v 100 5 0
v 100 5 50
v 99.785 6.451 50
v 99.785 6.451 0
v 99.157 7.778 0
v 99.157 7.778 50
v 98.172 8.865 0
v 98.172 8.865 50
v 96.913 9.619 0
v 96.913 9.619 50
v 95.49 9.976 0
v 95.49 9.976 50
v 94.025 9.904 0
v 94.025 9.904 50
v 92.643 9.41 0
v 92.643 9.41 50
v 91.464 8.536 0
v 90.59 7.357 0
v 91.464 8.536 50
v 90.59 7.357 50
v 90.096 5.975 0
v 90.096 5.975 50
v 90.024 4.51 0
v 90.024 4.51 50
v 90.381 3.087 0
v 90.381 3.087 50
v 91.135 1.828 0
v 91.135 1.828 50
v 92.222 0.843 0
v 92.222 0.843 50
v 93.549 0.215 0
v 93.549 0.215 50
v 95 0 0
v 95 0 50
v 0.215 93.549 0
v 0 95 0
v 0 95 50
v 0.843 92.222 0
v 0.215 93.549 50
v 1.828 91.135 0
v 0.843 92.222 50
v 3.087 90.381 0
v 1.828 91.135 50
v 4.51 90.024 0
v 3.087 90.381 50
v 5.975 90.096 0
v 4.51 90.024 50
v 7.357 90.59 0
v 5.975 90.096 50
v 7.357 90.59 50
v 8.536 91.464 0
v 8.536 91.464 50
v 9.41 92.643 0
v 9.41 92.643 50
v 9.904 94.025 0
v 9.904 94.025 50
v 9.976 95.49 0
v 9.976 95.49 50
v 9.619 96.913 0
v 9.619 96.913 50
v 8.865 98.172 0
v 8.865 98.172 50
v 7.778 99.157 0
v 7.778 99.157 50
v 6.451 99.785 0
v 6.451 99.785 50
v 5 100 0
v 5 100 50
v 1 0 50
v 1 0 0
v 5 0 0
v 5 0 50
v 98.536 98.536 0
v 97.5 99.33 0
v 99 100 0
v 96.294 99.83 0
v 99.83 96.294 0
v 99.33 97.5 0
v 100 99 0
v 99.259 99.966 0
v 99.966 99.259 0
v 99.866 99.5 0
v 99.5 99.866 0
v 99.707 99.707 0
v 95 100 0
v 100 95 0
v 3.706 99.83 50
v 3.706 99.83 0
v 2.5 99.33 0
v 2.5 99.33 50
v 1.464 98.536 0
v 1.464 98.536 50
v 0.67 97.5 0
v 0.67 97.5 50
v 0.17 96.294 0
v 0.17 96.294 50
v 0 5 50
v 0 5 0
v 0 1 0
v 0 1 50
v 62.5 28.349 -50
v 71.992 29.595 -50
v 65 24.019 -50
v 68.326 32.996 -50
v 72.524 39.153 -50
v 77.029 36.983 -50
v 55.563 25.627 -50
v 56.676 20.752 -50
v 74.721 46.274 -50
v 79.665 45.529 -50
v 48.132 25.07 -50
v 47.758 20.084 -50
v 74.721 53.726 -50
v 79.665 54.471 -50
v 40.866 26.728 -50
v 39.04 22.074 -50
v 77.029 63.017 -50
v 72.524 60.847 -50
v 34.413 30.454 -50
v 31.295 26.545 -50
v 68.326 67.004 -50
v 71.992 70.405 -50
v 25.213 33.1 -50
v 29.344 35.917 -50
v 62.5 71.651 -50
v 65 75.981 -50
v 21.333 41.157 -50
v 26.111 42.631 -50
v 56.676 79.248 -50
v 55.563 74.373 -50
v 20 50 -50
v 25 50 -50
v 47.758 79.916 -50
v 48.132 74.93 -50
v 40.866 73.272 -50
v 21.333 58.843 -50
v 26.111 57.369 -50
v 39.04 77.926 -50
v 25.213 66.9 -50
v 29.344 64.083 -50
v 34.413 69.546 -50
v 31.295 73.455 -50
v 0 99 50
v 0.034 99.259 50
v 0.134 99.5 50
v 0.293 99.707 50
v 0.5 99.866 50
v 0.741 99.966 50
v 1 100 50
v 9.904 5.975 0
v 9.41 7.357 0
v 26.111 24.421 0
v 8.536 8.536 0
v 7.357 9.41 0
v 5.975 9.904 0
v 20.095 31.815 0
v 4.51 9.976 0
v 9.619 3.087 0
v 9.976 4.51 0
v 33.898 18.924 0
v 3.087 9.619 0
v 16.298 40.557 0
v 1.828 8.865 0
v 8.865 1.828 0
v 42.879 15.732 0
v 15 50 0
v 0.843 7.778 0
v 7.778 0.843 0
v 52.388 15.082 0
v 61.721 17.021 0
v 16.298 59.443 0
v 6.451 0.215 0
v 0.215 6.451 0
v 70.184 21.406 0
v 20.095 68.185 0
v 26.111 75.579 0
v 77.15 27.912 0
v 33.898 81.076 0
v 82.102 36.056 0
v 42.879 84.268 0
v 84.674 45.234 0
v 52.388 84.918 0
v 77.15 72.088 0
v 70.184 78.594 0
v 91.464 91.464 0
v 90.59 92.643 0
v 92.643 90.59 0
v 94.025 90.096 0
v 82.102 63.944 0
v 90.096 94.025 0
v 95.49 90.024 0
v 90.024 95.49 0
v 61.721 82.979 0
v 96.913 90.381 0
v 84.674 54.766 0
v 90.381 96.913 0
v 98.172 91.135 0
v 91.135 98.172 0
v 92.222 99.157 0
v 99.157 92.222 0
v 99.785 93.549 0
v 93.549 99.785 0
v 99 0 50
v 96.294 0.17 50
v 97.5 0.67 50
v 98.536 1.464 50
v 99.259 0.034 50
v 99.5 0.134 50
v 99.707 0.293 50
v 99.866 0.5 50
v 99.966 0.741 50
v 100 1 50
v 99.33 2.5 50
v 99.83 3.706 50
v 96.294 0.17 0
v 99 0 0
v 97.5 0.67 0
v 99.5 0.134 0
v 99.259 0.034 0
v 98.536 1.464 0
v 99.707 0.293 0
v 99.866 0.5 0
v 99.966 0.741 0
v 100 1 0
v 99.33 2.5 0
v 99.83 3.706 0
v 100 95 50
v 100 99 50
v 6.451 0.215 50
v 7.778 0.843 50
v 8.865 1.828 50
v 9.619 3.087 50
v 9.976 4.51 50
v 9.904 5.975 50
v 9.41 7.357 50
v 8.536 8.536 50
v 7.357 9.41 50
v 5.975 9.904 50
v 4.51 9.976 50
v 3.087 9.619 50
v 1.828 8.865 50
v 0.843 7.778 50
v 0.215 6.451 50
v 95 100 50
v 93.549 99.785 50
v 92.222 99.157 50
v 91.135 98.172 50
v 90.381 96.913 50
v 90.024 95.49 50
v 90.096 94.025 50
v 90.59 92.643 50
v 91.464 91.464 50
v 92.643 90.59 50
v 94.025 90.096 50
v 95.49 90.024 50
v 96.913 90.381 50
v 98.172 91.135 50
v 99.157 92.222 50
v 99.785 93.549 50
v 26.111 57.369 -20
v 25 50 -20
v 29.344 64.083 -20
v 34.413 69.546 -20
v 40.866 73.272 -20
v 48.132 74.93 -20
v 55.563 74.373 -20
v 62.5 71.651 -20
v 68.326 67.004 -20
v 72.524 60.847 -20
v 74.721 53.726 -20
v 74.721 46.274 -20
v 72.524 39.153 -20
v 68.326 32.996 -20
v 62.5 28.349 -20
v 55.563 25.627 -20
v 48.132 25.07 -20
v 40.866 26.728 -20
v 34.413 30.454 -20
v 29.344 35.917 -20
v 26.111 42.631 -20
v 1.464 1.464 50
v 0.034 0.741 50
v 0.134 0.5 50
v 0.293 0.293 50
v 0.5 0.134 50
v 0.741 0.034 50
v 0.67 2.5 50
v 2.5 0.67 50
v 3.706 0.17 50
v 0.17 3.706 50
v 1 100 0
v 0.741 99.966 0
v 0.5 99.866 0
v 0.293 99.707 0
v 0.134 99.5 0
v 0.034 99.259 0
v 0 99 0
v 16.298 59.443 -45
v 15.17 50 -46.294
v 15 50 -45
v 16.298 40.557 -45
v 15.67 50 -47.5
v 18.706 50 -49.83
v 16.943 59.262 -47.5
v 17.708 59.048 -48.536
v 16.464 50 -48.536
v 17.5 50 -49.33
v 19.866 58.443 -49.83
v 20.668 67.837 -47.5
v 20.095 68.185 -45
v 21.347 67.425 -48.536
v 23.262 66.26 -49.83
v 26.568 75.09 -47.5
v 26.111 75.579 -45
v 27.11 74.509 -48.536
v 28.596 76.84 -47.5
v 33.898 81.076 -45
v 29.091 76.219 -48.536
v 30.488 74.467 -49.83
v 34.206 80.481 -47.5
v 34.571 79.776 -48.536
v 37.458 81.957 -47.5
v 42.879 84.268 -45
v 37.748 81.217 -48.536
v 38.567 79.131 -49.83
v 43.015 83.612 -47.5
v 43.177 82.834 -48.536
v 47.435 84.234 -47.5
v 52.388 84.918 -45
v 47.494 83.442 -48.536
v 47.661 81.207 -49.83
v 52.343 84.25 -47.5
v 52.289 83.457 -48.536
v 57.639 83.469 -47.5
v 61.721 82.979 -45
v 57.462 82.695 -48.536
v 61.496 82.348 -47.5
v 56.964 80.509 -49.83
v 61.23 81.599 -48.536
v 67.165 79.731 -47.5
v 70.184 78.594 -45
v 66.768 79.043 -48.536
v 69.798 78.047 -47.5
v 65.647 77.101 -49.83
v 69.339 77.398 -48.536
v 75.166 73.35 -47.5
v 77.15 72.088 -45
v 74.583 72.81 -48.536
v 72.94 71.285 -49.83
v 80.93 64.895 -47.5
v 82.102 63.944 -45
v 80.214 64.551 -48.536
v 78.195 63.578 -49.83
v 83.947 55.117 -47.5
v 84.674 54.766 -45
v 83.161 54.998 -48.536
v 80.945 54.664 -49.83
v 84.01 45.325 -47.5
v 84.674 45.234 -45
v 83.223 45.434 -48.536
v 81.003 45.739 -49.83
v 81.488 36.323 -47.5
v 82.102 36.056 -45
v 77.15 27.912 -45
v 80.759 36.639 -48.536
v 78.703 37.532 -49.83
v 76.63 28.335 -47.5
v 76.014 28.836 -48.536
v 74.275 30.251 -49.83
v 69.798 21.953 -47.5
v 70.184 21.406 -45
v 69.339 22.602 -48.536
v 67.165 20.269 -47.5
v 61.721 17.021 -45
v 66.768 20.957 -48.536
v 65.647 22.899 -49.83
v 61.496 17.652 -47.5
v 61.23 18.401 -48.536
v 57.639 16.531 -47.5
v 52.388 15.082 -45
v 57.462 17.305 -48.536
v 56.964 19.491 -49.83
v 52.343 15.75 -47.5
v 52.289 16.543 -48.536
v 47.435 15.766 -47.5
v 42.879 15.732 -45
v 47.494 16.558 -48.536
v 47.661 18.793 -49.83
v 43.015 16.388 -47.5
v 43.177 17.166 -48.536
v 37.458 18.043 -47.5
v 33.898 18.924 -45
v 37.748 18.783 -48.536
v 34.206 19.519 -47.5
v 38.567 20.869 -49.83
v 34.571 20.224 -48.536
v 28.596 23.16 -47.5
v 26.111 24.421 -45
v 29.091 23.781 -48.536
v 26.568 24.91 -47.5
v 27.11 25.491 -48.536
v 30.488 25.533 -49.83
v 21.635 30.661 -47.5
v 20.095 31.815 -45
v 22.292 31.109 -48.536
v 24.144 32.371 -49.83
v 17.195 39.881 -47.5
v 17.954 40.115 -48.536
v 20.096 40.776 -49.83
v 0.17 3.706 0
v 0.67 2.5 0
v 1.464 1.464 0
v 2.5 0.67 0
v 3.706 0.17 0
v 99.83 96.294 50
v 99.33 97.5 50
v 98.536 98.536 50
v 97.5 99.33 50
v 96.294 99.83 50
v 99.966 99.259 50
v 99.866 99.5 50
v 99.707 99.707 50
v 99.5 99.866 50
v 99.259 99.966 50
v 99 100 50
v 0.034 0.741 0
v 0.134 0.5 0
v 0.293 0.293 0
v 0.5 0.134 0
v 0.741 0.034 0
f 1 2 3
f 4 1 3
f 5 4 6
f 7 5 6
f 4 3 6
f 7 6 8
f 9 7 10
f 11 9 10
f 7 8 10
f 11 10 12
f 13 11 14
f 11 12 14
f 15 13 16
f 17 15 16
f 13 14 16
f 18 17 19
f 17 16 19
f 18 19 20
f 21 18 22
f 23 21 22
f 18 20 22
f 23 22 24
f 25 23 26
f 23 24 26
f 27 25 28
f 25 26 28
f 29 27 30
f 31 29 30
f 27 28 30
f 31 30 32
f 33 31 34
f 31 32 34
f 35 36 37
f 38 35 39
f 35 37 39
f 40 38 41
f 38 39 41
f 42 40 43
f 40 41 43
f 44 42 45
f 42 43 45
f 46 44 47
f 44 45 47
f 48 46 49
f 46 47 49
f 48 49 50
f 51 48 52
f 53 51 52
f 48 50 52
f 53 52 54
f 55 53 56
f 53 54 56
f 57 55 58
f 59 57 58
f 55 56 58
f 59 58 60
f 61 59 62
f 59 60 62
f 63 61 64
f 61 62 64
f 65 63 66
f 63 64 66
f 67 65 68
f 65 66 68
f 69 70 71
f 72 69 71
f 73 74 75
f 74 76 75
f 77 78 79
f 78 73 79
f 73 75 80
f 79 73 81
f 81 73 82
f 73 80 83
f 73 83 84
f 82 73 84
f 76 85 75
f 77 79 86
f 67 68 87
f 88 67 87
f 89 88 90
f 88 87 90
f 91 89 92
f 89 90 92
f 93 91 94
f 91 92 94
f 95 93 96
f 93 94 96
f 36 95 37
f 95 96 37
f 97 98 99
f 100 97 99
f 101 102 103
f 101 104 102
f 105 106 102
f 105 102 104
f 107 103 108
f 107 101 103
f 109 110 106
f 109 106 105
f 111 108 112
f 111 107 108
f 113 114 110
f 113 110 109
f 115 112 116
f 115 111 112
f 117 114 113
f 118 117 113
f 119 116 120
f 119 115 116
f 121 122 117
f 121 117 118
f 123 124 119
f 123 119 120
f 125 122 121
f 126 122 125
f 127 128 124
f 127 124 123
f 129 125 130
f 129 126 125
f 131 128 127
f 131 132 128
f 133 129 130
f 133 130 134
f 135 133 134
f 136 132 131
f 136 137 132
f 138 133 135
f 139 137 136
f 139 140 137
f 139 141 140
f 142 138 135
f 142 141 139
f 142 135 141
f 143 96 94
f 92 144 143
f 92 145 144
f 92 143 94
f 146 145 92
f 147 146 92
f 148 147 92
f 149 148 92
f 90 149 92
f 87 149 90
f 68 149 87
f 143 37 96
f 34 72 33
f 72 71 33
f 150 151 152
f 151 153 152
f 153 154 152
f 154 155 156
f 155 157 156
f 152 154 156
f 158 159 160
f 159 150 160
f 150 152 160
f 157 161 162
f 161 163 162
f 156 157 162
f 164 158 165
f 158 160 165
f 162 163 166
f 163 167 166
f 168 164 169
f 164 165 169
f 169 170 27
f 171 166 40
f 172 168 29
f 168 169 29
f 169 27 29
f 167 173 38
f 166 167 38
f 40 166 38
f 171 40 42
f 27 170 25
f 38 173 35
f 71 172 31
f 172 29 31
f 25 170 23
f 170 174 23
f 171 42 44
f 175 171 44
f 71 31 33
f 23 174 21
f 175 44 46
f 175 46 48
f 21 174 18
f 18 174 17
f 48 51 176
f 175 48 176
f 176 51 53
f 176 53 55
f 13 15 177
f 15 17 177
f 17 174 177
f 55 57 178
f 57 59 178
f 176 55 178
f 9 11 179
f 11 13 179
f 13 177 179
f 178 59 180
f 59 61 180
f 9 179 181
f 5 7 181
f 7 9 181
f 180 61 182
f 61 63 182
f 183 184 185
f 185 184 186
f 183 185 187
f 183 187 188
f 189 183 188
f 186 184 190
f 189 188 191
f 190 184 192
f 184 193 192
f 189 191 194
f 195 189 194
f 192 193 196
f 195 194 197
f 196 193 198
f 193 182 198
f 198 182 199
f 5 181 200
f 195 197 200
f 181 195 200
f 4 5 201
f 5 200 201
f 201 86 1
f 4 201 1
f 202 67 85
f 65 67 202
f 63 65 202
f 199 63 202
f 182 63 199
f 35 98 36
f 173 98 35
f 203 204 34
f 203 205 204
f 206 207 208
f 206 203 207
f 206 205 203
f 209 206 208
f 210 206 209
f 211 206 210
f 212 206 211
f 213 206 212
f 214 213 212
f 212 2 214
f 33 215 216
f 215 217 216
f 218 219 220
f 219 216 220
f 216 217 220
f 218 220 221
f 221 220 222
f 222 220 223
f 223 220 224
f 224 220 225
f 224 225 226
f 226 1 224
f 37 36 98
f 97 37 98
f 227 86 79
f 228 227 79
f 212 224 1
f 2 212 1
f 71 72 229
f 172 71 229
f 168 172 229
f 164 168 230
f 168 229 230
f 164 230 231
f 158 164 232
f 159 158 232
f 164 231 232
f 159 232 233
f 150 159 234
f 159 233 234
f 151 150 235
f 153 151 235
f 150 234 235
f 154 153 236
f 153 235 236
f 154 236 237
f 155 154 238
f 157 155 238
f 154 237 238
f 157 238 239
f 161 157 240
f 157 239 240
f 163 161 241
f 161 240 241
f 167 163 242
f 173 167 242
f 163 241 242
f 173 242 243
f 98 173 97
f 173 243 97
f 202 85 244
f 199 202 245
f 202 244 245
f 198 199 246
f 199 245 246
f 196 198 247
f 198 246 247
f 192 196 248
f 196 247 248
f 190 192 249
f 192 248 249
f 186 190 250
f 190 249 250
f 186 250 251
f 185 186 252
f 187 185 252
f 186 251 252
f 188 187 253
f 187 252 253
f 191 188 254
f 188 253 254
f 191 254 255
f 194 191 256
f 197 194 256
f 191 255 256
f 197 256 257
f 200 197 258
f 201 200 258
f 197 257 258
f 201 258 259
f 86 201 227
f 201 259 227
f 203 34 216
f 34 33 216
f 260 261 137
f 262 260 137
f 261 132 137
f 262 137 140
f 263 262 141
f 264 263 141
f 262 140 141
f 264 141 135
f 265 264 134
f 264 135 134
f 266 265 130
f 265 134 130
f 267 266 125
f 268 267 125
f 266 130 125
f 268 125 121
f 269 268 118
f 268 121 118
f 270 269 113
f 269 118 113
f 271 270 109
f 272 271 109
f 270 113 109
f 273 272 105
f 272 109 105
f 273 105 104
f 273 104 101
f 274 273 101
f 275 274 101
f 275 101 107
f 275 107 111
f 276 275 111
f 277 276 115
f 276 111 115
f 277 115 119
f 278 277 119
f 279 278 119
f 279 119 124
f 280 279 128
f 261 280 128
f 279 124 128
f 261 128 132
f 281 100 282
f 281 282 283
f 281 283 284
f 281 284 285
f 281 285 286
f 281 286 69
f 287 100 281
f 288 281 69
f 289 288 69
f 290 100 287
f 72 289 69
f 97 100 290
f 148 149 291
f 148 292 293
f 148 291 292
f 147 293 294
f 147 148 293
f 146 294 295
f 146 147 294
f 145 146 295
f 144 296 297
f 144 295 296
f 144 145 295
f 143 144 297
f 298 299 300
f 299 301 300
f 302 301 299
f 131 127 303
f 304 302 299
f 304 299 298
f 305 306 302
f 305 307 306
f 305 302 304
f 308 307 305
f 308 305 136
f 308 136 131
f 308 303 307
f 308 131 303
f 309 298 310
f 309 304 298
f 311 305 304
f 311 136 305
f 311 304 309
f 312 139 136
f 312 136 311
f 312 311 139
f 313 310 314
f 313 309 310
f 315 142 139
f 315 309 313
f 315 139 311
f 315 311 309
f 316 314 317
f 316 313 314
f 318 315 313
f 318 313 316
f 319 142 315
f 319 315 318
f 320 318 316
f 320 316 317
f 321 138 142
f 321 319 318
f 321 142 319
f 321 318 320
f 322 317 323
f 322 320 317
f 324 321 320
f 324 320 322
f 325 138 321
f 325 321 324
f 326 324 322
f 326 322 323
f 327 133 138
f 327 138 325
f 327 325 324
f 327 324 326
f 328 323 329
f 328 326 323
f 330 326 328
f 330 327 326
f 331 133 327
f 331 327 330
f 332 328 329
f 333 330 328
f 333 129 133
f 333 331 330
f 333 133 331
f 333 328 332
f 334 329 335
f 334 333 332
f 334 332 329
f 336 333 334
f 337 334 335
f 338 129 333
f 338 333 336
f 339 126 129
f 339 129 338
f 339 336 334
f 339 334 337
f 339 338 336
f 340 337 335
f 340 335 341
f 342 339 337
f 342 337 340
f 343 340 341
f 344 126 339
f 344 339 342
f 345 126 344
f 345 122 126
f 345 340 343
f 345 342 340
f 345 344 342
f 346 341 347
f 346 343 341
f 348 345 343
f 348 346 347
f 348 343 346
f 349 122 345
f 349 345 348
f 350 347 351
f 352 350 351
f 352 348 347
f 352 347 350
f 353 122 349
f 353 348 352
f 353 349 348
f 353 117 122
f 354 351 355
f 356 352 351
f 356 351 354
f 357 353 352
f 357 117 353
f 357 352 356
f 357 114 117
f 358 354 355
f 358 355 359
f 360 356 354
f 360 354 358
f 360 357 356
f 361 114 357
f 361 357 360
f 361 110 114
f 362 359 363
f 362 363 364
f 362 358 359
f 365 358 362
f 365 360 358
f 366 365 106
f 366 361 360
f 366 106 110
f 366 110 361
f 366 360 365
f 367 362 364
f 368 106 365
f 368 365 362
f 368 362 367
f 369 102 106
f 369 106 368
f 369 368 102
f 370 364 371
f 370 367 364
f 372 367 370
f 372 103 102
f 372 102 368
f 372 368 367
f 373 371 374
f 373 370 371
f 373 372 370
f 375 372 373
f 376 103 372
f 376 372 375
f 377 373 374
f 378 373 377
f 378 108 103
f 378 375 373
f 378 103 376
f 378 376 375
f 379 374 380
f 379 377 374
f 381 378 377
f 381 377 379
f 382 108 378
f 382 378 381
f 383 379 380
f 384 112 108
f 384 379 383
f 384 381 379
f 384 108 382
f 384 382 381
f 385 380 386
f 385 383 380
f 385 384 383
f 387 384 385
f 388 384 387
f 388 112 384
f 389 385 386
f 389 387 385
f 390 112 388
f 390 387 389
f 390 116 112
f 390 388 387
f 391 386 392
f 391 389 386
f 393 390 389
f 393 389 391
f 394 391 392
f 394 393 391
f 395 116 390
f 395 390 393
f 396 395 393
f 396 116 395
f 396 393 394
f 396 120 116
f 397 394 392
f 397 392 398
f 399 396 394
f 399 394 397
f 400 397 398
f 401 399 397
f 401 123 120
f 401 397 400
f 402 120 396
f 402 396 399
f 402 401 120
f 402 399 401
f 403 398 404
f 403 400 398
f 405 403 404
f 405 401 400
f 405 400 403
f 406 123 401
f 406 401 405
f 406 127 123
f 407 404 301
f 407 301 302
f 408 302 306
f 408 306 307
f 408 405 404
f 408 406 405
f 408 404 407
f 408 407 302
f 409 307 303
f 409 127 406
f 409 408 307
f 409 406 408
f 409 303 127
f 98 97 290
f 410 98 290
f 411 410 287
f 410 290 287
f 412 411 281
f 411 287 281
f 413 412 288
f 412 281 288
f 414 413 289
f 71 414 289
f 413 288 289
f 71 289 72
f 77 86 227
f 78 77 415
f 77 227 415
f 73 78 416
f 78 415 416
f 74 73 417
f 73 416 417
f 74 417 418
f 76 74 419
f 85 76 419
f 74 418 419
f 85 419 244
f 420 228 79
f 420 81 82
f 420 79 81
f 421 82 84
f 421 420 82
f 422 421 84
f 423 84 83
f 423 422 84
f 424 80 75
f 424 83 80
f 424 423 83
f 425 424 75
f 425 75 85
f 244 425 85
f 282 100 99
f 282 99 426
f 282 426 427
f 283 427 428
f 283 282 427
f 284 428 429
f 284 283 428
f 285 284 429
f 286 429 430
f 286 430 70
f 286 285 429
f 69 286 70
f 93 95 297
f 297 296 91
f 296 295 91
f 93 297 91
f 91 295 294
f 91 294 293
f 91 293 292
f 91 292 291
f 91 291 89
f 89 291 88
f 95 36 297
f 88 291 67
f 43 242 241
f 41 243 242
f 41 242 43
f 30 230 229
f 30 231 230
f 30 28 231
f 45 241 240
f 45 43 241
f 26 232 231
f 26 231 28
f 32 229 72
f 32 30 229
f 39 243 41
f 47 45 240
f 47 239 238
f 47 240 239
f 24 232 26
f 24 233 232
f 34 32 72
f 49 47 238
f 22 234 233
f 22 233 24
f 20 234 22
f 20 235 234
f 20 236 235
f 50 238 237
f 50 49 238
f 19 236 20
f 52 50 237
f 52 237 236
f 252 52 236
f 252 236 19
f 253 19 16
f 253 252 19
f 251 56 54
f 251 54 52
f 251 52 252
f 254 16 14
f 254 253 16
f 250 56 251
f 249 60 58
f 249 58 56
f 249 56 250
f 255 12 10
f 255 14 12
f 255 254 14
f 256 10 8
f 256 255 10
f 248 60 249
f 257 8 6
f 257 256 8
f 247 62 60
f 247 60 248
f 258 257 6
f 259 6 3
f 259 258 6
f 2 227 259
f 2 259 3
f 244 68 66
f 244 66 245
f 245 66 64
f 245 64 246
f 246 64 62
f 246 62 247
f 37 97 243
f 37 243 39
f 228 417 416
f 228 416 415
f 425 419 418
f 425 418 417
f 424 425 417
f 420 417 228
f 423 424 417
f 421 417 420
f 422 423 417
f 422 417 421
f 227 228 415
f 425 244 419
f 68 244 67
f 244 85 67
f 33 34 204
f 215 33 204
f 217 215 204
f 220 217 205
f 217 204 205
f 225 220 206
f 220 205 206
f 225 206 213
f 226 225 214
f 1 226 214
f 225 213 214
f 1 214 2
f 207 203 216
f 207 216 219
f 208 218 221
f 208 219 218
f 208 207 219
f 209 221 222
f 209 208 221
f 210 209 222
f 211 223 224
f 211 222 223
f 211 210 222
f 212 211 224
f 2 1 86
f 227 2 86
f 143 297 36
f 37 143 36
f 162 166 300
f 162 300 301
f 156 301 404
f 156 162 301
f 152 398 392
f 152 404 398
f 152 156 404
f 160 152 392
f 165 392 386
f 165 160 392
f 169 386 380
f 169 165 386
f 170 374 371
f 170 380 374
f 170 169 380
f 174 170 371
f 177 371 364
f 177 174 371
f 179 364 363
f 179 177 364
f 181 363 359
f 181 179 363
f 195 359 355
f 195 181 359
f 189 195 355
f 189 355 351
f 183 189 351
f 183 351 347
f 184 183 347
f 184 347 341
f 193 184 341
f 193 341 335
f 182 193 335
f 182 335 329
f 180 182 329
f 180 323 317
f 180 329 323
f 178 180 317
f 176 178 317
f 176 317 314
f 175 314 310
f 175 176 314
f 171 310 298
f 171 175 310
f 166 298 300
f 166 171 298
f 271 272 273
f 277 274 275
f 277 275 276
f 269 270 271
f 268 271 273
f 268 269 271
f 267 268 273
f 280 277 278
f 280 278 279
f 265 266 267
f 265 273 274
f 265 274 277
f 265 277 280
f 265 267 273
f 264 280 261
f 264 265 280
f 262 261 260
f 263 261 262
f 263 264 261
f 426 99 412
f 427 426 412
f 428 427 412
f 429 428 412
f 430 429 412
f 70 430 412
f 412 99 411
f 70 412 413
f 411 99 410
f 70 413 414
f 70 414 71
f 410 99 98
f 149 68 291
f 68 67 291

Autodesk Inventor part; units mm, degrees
ref_plane "YZ Plane" through (0, 0, 0) normal (1, 0, 0) x (0, 1, 0)
ref_plane "XZ Plane" through (0, 0, 0) normal (0, 1, 0) x (-1, 0, 0)
ref_plane "XY Plane" through (0, 0, 0) normal (0, 0, 1) x (1, 0, 0)
sketch "Sketch1" plane through (0, 0, 0) normal (0, 0, 1) x (1, 0, 0)
  line L0 (0, 0) -> (100, 0)
  line L1 (100, 0) -> (100, 100)
  line L2 (100, 100) -> (0, 100)
  line L3 (0, 100) -> (0, 0)
  dimension "d0" = 100
  dimension "d1" = 100
extrude "Extrusion1" add sketch "Sketch1" along normal blind 50
sketch "Sketch2" plane through (0, 0, 50) normal (0, 0, 1) x (1, 0, 0)
  point P0 (0, 0)
sketch "Sketch5" plane through (0, 0, 50) normal (0, 0, 1) x (1, 0, 0)
  line L0 (5, 5) -> (95, 95) construction
  line L1 (95, 5) -> (5, 95) construction
  circle A0 centre (5, 95) radius 5
  line L2 (0, 100) -> (0, 0) projected
  circle A1 centre (95, 95) radius 5
  line L3 (100, 100) -> (0, 100) projected
  circle A2 centre (95, 5) radius 5
  circle A3 centre (5, 5) radius 5
  point P0 (50, 50)
  dimension "d11" = 90
  dimension "d12" = 90
extrude "Extrusion2" cut sketch "Sketch5" against normal blind 50 contours A0 | A3 | A1 | A2
fillet "Fillet1" radius 1 1 edges at (0, 100, 25)
fillet "Fillet2" radius 1 1 edges at (100, 100, 25)
fillet "Fillet3" radius 1 1 edges at (0, 0, 25)
fillet "Fillet4" radius 1 1 edges at (100, 0, 25)
sketch "Sketch6" plane through (0, 0, 0) normal (0, 0, -1) x (-1, 0, 0)
  line L0 (-15, 15) -> (-85, 85) construction
  line L1 (-85, 15) -> (-15, 85) construction
  circle A0 centre (-50, 50) radius 35
  point P0 (0, 0)
  dimension "d20" = 70
  dimension "d21" = 70
extrude "Extrusion3" add sketch "Sketch6" along normal blind 50
sketch "Sketch7" plane through (50, 50, -50) normal (0, 0, -1) x (-1, 0, 0)
  circle A0 centre (0, 0) radius 25
  point P0 (50, -50)
  dimension "d24" = 50
extrude "Extrusion4" cut sketch "Sketch7" against normal blind 30
fillet "Fillet5" radius 5 1 edges at (85, 50, -50)
thread "Thread1" size "M50x4" class "6H" standard "ANSI Metric M Profile" full length
properties part number "Tarea1jrsr"
